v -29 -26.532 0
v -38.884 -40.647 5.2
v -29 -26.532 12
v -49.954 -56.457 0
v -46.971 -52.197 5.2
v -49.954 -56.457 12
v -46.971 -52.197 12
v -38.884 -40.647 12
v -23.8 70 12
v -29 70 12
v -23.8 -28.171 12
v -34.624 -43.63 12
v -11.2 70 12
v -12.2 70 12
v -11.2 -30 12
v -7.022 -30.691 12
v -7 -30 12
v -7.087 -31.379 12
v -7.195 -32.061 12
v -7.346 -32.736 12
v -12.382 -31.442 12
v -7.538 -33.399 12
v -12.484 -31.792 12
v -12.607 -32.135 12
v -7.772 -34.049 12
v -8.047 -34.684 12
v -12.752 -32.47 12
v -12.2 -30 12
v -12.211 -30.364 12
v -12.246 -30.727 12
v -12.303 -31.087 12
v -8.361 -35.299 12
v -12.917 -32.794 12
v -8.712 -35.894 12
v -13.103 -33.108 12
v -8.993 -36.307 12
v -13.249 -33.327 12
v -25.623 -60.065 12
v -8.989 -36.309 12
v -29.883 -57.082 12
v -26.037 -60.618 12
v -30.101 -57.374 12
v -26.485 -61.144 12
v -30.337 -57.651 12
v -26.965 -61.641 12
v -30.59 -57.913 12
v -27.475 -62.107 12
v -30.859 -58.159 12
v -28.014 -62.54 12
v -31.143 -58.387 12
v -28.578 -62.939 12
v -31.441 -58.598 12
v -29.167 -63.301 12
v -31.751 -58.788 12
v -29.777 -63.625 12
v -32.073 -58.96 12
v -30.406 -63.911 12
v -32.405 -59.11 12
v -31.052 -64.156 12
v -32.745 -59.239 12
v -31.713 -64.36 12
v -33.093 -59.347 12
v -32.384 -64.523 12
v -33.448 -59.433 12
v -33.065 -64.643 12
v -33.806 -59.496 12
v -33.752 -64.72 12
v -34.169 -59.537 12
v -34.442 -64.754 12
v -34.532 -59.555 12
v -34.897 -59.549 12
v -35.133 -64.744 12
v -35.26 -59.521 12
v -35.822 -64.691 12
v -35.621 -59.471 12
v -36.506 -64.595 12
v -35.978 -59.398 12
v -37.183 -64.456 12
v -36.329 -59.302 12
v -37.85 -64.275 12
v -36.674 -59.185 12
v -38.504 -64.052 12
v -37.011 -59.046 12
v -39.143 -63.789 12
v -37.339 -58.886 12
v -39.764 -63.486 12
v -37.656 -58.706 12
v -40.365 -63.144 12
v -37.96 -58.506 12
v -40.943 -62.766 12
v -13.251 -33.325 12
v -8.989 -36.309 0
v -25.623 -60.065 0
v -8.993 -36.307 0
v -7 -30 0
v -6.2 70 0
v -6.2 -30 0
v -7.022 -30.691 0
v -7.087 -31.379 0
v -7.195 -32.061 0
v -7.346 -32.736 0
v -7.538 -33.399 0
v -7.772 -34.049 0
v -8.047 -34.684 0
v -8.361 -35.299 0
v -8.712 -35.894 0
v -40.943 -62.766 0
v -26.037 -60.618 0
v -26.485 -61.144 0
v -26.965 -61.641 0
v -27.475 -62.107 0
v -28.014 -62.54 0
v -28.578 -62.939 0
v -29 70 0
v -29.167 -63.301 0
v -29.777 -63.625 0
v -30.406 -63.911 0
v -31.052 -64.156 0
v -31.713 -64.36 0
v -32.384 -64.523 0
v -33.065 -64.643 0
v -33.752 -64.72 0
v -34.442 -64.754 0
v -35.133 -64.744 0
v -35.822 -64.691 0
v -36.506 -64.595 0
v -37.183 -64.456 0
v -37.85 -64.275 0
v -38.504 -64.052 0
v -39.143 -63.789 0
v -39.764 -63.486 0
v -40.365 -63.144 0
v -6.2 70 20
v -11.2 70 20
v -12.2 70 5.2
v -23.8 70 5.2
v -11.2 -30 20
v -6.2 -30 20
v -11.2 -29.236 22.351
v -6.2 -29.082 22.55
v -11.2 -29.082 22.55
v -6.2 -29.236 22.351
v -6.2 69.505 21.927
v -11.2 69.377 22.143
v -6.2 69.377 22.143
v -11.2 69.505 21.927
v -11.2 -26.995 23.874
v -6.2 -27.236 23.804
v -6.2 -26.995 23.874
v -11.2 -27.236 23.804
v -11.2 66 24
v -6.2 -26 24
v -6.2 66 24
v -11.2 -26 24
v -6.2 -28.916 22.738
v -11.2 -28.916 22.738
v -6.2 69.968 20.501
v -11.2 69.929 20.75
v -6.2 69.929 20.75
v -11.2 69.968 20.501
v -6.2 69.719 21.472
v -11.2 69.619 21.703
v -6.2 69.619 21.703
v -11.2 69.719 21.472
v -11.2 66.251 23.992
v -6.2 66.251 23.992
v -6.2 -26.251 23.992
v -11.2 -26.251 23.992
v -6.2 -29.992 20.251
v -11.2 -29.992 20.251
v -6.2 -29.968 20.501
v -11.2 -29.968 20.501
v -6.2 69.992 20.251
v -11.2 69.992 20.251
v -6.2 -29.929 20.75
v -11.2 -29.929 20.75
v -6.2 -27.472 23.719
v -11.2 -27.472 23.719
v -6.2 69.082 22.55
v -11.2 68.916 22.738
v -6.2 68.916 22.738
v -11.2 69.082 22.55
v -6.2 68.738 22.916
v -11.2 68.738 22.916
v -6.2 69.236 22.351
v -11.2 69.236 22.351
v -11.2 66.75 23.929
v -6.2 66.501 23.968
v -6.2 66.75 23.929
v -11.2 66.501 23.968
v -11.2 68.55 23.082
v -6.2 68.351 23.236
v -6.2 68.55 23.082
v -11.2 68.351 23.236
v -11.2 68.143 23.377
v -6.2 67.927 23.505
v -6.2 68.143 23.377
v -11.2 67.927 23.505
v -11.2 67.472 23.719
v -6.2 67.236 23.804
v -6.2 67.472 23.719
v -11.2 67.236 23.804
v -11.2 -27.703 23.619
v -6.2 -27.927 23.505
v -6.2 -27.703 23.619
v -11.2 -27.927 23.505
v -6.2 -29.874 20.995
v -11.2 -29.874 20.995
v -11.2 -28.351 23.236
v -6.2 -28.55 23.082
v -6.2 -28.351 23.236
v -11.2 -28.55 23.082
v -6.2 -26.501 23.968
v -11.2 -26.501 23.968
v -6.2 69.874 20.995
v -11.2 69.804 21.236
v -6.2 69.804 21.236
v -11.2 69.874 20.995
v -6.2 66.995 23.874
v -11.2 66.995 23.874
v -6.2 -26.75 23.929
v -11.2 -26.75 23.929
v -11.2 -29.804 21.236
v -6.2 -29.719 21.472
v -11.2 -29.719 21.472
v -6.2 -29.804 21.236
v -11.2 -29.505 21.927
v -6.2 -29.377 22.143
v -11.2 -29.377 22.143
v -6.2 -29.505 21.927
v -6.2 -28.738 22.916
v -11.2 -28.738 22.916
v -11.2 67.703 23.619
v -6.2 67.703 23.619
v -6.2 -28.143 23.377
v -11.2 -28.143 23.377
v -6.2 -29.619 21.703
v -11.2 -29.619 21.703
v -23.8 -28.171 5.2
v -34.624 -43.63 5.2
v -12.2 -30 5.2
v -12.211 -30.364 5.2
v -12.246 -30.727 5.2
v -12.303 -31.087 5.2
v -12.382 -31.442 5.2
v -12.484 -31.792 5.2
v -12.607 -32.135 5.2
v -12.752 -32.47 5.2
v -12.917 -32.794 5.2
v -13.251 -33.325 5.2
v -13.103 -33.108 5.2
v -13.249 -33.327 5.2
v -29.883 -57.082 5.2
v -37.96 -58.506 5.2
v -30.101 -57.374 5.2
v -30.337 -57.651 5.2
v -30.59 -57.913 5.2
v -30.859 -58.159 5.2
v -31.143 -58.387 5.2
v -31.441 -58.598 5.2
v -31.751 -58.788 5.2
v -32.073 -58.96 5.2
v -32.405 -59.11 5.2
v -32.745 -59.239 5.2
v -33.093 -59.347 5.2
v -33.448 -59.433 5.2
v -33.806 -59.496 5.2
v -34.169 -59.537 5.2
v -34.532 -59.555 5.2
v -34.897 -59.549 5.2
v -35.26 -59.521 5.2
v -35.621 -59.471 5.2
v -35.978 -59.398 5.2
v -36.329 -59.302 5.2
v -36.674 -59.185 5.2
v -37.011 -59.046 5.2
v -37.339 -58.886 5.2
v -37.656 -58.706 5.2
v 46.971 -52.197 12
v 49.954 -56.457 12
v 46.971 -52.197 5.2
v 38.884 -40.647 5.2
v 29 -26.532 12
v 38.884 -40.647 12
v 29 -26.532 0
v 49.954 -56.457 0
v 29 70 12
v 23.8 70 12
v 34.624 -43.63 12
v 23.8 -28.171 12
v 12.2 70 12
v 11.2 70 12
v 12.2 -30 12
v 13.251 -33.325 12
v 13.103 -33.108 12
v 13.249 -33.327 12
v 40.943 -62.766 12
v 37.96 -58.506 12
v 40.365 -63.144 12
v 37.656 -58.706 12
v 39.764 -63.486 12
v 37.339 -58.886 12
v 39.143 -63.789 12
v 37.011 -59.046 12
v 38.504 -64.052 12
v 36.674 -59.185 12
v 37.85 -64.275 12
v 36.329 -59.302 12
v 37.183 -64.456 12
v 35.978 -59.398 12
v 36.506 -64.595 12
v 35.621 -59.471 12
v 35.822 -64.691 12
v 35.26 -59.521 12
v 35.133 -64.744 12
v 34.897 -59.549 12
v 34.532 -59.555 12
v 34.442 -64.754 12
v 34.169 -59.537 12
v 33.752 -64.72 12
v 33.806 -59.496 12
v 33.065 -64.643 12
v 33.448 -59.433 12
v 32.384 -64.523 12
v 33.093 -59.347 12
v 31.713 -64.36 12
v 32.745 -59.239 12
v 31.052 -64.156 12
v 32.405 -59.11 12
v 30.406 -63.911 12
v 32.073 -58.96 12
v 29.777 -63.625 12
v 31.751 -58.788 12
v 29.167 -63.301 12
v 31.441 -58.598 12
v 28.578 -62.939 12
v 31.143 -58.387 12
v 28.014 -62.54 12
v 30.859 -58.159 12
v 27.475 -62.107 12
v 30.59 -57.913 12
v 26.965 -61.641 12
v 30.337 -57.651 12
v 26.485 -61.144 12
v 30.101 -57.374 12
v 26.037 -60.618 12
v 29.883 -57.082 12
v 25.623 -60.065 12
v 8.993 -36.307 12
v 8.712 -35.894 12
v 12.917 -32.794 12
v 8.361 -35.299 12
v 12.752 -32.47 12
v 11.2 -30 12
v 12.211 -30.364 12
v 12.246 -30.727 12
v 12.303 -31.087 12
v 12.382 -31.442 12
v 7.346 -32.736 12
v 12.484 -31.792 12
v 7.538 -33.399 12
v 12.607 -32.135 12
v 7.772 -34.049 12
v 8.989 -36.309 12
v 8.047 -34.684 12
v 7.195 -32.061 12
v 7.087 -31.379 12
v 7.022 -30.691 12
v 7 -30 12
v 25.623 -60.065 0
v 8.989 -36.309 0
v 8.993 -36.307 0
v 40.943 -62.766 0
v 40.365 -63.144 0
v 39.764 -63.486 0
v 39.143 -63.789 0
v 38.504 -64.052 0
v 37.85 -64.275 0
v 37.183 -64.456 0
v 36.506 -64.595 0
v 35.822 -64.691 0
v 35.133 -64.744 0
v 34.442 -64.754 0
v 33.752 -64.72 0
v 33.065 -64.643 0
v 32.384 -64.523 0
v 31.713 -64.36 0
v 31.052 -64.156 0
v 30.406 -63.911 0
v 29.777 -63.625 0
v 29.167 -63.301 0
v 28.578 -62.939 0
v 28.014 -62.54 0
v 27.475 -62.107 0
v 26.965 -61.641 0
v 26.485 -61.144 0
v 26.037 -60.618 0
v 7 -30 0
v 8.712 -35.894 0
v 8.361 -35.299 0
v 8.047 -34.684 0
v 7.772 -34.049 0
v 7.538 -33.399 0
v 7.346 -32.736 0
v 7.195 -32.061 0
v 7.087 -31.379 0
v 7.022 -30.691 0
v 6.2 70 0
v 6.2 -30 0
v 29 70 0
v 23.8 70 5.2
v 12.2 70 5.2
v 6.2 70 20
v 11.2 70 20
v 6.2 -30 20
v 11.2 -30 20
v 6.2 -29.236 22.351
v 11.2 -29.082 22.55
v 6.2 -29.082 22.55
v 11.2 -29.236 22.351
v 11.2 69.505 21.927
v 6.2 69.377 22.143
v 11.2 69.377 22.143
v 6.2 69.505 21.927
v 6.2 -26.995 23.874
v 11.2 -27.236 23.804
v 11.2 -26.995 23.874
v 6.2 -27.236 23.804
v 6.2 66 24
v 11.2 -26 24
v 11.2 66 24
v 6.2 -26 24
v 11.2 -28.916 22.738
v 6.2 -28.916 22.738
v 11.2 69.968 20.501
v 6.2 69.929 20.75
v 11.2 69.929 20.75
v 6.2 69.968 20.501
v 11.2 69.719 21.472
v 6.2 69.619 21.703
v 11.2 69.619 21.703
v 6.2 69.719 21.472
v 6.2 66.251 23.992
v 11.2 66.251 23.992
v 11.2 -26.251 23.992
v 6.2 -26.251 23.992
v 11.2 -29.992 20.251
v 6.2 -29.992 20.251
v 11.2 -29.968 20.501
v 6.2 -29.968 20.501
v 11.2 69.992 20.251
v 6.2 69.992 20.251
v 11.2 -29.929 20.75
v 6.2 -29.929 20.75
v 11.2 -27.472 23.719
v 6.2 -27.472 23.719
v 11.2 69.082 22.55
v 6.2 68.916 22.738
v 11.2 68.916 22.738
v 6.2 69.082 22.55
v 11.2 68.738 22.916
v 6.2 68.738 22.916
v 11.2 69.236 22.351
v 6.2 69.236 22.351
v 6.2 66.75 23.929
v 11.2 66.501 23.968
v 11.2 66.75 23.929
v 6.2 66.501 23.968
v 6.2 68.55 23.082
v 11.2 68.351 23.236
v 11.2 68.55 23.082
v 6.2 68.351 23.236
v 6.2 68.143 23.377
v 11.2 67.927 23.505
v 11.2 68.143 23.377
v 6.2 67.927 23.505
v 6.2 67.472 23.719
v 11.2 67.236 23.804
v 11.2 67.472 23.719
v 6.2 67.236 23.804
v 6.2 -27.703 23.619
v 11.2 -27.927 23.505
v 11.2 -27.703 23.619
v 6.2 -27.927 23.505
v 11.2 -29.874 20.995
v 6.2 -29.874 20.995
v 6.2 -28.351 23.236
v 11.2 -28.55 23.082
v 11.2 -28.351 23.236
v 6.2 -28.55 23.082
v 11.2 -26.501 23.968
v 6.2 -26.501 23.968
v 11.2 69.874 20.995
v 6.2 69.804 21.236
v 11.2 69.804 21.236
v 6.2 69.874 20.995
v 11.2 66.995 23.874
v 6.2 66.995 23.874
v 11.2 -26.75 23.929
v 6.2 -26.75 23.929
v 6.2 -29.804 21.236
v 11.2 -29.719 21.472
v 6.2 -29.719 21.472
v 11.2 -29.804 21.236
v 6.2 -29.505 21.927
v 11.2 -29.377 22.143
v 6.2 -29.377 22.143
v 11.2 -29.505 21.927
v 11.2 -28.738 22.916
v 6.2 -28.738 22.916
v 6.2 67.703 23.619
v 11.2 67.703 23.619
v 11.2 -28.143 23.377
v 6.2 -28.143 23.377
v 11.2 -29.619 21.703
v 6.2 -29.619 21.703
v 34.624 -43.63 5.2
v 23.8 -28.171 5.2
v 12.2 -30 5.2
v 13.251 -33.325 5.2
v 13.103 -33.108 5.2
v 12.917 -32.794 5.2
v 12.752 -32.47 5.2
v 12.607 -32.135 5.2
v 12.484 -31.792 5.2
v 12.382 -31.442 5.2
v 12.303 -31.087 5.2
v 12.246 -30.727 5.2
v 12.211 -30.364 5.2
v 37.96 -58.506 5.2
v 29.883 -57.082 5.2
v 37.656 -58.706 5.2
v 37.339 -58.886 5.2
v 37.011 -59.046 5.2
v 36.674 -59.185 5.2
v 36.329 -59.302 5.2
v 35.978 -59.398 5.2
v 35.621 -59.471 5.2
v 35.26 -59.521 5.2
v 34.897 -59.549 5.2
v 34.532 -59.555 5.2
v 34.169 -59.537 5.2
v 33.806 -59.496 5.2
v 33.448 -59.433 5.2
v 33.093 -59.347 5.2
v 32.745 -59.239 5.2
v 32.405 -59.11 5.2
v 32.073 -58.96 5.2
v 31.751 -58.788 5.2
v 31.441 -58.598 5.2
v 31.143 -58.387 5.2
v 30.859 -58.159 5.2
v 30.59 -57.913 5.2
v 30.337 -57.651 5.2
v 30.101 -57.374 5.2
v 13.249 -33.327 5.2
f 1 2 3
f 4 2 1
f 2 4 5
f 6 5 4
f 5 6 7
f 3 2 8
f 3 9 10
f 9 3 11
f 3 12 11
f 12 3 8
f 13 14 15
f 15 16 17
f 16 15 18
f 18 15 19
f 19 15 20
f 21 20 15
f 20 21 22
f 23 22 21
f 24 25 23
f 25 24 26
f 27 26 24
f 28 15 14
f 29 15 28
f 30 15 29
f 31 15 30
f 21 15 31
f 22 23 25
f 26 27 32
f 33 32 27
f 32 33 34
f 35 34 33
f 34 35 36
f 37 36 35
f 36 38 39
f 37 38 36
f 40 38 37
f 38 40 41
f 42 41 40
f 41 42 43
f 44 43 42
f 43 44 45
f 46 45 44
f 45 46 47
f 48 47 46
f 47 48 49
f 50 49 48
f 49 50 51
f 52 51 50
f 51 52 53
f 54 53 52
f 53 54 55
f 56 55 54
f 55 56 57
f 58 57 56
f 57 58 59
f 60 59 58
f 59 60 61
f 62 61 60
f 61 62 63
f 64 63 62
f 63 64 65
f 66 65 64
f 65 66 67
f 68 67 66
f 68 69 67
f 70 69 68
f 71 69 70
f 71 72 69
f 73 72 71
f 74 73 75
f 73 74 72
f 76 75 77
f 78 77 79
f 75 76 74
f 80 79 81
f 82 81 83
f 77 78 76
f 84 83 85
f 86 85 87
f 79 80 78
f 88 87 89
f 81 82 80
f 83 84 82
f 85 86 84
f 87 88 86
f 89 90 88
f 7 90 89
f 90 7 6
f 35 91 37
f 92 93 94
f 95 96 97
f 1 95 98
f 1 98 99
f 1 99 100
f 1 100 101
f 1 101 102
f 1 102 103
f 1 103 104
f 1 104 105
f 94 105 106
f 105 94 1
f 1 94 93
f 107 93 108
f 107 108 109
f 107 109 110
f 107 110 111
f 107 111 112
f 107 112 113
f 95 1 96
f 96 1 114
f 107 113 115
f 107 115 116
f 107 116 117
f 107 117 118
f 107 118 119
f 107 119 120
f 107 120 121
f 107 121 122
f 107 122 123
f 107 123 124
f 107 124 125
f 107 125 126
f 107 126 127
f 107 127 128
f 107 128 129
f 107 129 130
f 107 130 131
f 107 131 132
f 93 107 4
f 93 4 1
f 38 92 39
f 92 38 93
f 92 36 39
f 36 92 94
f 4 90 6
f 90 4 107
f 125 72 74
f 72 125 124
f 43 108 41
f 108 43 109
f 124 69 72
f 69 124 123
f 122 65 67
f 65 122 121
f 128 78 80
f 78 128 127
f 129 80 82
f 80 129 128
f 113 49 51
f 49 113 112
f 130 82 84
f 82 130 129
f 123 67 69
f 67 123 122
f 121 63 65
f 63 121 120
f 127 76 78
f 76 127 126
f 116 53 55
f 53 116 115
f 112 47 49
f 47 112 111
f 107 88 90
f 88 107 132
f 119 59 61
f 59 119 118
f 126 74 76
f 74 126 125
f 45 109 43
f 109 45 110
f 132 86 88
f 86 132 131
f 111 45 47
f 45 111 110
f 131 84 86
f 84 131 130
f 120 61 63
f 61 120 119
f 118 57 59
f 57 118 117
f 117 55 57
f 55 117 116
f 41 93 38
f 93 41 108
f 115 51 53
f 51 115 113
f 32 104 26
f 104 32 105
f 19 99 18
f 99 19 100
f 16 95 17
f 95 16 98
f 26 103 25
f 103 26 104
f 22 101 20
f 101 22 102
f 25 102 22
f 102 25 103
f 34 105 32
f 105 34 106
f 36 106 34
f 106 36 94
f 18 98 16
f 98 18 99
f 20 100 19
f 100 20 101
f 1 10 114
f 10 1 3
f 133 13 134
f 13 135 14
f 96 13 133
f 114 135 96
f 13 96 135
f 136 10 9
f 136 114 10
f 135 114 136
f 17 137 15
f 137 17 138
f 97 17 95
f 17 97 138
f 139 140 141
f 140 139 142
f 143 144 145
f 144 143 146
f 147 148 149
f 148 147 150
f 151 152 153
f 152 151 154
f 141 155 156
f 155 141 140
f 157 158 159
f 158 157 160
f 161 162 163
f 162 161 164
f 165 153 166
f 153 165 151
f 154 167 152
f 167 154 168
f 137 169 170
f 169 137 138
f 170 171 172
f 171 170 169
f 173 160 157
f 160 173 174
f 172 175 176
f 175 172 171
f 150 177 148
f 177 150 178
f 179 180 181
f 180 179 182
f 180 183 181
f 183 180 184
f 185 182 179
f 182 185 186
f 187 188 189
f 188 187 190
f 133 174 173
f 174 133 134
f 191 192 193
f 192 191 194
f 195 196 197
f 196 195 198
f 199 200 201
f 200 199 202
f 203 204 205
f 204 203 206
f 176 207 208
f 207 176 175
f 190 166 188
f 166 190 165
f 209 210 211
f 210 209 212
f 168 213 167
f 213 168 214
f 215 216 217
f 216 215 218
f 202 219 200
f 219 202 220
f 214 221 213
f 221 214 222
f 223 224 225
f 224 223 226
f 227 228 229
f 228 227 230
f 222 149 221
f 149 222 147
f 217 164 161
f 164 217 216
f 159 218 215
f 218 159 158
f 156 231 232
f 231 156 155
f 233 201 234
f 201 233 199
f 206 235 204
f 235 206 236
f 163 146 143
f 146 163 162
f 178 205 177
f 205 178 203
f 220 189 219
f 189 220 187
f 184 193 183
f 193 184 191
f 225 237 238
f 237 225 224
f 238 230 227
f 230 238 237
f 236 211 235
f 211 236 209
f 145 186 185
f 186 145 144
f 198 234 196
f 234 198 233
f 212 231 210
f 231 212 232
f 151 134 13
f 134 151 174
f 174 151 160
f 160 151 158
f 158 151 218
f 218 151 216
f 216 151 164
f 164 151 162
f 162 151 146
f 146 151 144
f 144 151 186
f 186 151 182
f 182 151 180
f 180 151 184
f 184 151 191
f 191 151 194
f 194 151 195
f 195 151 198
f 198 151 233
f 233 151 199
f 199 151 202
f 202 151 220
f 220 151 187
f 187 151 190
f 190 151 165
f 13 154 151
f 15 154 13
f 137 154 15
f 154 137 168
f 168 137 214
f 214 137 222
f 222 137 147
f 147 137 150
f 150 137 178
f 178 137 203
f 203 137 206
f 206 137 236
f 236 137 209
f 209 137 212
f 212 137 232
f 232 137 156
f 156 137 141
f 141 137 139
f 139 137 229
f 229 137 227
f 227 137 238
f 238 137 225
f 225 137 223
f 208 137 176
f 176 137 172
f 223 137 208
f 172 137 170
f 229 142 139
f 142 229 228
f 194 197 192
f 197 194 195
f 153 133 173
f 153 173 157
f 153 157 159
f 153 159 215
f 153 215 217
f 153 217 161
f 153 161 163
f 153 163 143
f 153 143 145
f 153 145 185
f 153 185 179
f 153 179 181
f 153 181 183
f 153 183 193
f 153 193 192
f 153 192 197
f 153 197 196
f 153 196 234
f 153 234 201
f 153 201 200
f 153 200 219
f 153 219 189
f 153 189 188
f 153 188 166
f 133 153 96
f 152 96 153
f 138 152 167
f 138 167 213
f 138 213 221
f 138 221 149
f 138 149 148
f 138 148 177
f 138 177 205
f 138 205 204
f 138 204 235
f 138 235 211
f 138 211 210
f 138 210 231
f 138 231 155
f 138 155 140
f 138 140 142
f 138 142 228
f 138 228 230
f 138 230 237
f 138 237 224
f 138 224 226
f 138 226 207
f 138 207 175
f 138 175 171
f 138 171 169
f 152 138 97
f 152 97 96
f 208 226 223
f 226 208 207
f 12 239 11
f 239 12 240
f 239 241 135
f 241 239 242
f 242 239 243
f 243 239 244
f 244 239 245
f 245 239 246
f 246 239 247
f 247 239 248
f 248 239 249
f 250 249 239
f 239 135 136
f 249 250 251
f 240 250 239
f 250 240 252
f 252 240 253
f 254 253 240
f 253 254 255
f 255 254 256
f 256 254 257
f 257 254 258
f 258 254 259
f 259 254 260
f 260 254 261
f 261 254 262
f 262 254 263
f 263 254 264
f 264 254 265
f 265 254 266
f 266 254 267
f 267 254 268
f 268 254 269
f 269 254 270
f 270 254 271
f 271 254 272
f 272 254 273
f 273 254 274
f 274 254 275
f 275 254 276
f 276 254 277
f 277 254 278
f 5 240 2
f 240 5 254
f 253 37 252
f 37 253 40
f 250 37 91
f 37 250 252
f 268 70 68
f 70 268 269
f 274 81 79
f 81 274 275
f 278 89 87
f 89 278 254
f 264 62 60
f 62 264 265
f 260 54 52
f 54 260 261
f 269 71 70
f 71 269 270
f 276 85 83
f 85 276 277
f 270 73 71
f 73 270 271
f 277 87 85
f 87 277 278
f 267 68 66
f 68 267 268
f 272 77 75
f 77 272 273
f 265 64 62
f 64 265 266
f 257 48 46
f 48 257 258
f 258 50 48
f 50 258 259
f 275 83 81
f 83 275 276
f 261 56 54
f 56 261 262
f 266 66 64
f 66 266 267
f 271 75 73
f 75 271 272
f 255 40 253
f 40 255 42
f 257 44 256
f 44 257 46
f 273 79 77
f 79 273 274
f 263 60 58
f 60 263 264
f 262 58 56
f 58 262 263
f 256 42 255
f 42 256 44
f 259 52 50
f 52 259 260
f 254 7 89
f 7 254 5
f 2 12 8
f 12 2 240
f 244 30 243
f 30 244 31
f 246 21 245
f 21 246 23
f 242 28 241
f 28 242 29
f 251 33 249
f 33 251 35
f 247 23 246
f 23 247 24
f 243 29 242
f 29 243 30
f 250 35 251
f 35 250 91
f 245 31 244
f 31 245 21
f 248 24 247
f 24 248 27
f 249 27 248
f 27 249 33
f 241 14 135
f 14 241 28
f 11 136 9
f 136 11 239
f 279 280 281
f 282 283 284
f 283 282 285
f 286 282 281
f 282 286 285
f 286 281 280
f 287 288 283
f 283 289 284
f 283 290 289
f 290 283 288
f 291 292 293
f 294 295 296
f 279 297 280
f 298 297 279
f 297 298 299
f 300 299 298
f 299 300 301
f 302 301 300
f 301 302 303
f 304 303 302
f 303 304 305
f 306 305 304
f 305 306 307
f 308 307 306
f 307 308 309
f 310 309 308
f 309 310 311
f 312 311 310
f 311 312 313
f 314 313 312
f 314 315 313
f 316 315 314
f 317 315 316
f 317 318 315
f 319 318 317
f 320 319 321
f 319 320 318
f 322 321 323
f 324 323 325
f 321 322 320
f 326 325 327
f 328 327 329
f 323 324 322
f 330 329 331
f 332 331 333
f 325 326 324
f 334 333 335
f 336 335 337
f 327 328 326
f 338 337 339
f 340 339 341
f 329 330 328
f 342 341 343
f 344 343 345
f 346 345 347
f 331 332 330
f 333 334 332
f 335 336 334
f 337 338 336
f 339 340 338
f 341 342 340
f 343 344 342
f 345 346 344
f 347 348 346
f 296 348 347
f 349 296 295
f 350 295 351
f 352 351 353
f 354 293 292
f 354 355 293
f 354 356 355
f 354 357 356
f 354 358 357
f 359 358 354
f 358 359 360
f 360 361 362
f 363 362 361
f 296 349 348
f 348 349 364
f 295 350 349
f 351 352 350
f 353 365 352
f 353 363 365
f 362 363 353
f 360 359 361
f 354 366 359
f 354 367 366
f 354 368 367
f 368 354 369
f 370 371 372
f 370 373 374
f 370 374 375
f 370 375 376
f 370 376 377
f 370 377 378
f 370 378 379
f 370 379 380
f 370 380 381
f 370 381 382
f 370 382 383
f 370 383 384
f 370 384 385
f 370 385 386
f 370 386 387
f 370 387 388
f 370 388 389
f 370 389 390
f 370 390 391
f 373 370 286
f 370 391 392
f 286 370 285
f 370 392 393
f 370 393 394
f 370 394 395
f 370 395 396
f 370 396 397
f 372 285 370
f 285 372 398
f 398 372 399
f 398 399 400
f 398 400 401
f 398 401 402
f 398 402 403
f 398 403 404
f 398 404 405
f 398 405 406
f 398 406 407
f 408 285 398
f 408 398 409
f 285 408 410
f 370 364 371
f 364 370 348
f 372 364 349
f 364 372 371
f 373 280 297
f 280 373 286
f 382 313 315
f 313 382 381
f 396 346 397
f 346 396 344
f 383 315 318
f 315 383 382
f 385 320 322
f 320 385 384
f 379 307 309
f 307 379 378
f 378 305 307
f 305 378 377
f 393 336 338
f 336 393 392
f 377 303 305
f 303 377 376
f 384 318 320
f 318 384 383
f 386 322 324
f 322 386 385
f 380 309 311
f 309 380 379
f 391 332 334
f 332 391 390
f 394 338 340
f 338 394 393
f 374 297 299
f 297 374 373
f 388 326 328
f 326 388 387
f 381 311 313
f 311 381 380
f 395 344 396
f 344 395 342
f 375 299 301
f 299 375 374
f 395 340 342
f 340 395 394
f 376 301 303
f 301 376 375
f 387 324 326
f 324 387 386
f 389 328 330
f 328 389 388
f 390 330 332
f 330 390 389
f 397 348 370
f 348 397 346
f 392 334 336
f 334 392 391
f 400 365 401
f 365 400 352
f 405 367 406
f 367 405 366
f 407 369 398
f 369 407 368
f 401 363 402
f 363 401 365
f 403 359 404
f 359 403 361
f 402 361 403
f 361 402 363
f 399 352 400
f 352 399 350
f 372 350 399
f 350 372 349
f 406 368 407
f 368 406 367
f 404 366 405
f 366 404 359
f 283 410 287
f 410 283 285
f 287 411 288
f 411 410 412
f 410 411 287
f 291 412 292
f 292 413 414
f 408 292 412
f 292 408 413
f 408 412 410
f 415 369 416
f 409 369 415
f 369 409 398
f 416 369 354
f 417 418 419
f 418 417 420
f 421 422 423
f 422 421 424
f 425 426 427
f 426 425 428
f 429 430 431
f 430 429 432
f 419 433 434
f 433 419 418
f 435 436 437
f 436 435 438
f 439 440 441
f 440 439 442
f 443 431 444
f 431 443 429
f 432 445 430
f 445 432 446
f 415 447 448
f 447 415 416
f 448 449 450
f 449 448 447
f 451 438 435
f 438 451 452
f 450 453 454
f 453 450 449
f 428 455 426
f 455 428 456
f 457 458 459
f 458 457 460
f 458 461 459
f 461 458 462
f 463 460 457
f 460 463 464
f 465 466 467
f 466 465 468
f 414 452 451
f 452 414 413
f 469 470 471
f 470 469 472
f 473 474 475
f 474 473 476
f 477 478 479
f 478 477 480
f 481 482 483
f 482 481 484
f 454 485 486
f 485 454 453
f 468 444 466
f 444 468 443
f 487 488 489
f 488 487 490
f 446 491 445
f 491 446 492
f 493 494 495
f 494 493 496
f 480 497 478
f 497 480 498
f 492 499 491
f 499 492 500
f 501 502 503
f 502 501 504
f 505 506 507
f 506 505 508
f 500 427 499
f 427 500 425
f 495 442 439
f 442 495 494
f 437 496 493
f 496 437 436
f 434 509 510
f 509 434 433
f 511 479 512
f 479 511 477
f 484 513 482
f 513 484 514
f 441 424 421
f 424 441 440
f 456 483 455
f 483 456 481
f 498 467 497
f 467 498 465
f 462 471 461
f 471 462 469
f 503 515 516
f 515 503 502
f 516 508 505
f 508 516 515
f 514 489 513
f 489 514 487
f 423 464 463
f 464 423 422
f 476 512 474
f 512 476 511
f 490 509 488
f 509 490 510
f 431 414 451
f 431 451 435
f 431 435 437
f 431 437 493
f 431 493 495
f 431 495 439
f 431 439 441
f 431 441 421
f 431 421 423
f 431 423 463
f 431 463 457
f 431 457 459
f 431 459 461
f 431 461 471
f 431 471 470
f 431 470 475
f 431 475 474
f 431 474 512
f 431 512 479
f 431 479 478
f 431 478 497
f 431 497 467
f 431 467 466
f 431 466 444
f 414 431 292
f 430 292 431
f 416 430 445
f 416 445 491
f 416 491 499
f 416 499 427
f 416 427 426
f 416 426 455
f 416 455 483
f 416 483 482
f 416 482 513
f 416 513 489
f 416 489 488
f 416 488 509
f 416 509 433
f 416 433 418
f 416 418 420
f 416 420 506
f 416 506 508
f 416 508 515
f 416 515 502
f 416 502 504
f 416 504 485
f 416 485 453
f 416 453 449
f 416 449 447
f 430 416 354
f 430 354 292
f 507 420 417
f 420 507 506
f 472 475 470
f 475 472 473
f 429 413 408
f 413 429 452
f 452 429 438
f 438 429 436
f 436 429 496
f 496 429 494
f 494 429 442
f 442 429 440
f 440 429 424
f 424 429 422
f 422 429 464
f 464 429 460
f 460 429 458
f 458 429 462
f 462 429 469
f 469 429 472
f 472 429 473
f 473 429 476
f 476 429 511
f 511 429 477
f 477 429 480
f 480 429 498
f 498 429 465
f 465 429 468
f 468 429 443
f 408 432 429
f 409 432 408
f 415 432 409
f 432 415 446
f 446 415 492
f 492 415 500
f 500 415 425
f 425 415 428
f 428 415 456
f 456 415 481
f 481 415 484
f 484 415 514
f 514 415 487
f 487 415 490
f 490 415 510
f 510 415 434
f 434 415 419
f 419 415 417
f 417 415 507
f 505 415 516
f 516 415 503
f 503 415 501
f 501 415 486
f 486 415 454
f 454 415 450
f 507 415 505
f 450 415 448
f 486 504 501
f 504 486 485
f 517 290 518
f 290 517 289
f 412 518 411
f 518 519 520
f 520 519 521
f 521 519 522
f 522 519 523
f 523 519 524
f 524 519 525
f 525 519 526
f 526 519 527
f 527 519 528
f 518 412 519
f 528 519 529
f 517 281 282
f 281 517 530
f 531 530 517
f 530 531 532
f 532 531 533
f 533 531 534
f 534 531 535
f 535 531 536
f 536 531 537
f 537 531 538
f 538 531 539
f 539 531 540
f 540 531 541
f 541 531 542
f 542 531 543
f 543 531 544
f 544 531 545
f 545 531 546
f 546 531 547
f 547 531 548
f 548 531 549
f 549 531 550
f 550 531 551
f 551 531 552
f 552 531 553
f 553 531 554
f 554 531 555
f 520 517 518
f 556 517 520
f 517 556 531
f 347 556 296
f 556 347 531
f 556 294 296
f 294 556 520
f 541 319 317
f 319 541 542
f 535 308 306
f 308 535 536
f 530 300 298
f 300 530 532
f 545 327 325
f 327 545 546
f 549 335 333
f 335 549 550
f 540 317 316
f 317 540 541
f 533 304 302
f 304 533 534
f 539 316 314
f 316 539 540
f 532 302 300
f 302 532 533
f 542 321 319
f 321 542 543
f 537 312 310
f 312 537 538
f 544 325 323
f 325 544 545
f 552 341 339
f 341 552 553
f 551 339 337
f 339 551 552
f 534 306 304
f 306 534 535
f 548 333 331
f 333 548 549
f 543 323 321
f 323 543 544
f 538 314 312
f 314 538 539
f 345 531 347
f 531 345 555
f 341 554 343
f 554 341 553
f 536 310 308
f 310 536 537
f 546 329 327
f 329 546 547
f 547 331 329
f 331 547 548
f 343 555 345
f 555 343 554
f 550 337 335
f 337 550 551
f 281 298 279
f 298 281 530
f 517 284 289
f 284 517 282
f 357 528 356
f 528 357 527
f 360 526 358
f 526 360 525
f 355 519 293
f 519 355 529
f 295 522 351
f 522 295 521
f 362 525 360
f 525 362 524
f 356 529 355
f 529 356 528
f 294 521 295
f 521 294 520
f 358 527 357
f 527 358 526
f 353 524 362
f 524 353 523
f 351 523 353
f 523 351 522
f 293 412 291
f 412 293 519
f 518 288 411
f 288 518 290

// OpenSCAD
/*************************************************************
 *                        Battery Dispenser for Cylindrical Batteries                           *
 *                              By Blair Thompson    (AKA Justblair)                               *
 *                                                29/12/11                                                       *
 *                                        www.justblair.co.uk                                              *
 *                                              Version 1.0                                                      *
 *************************************************************/

// ***********************  Calibration ** ************************
// Calibrate Option.  If you wish to calibrate set this to true.  If you intend using screws to mount your battery holder
// Set the mount_tab and mount_holes variables to true to allow calibration of the mount holes as well
calibrate = false;		// If true, a calibration piece will be generated.

// *********************  Mount Tab Variables  *********************
mount_tab_opt = true;			// If true tabs will be produced
mount_tab_height = 8	;		// How high above the Channels to do you want the tab to extend
mount_tab_thickness = 5; 		// Set thicknes for the mount tab.  Beware, if you are printing models
						// for two different batt sizes, this will need to be adjusted if you want
						// the tabs to protrude the same distance from the channels.


// *********************  Back Plate Variables  *********************
back_plate= false;			// If true a backplate wil be created.
back_plate_holes_pan = true;		// If true Pan head recessess will be added 
back_plate_thickness = 6;		// Set thickness for back plate (if generated)


// *********** Mounting Holes Dimensions and Shape *******************
mount_holes = false;			// if true tabs will inculde mounting holes
mount_hole_diameter = 3;		// Hole diameters (if holes are generated)
holes_pan_diameter = 5.6; 		// Recess diameter(if generated), this is a sample value is not correct or tested
holes_pan_depth = 3;	 		// Recess depth, (if generated) this is a sample value is not correct or tested

// ***************  Channel Dimensions and Shape *******************
channel_extender_opt = false;	// Set to true if you wish to print an extension channel
$fn=100;					// Set the resolution of the curves
angle = 145;				// Sets the angle the lower section sits at
channel_depth = 12;			// How deep are the channels?  ie.  how tall the print?
channel_width = 22; 			// How wide are the channels?
lower_channel_length = 40;  		// Set lower section size
upper_channel_length= 100;		// Set upper section size

// ******************  Battery Dimensions  *************************
// Un-Comment the size that you need.  Commented lines begin //

// AAA Standard size of battery is 10.5mm x 44.5mm
battery_diameter = 11.6;  		// Needs to be set wider than your intended battery, narrower than the channel width.
battery_length = 46;			// Set slightly longer than your actual battery size

// AA  Standard size of battery is 14.5 x 50.5
// battery_diameter = 15.6;  		// Needs to be set wider than your intended battery, narrower than the channel width.
// battery_length = 52;			// Set slightly longer than your actual battery size

// ****************** Here Comes the Code! ************************

if (calibrate==true)
{
	translate ([channel_width/2,-10+lower_channel_length/2,0])  battery_holder_left(20);
} else if (channel_extender_opt != true){
	translate ([-channel_width/2-1-back_plate_thickness,-upper_channel_length/2+lower_channel_length/2,0]) 
		battery_holder_left(upper_channel_length);
	translate ([channel_width/2+1+back_plate_thickness,-upper_channel_length/2+lower_channel_length/2,0]) 
		mirror ([1,0,0]) battery_holder_left(upper_channel_length);
} else {
	translate ([-channel_width/2-1,0,0]) extension();
	translate ([+channel_width/2+1,0,0]) extension();
} // end if
	
// ************************ Modules ******************************

module battery_holder_left(tab){
	difference(){
		outer_shape(tab);
		inner_shape();


	} // end difference
} // end module

module outer_shape(outer_tab){
	cylinder (h=channel_depth, r=channel_width/2);

	if (calibrate != true){
		translate ([-channel_width/2,0,0]) cube ([channel_width, upper_channel_length, channel_depth]);
		if (back_plate == true){
			difference(){
			translate ([channel_width/2-(channel_width-battery_diameter)/2+1, 0,0]) 
				cube ([back_plate_thickness, upper_channel_length, (channel_width-battery_diameter)/2+battery_length/2]);
		if (mount_holes == true){
			back_plate_holes();
		} // end if
			} // end difference
		}  // end if
	} else {
		translate ([-channel_width/2,0,0]) cube ([channel_width, 20, channel_depth]);	
	} // end if
		if (mount_tab_opt == true){
			mount_tabs(outer_tab);
		} // end if


	rotate (angle,0,0) {
		translate([-channel_width/2,0,0]) cube ([channel_width,lower_channel_length-channel_width/2,channel_depth]);
		translate([0,0,0]) cube ([channel_width/2,lower_channel_length,channel_depth]);
		translate([0,lower_channel_length-channel_width/2,0]) cylinder (h=channel_depth, r=channel_width/2);	
	} // end rotate
} // end module

module inner_shape(){
	translate ([0,0,(channel_width-battery_diameter)/2]) 
		cylinder (h=channel_depth, r=battery_diameter/2);
	translate ([-battery_diameter/2, 0, (channel_width-battery_diameter)/2]) 
		cube ([battery_diameter,upper_channel_length+5,channel_depth]);
	rotate (angle,0,0) {
		translate ([-battery_diameter/2,0,(channel_width-battery_diameter)/2]) 
			cube ([battery_diameter,lower_channel_length-channel_width/2,channel_depth]);
		translate ([0,lower_channel_length-channel_width/2,(channel_width-battery_diameter)/2]) 
			cylinder (h=channel_depth, r=battery_diameter/2);
		translate ([0,lower_channel_length-channel_width/2-battery_diameter/2-2.5,(channel_width-battery_diameter)/2]) 
			cube ([50,battery_diameter+2.5,channel_depth]);
	} // end rotate
} // end 

module extension(){
	difference(){
		translate ([-channel_width/2,-upper_channel_length/2,0]) cube ([channel_width, upper_channel_length, channel_depth]);
	#translate ([-battery_diameter/2, -upper_channel_length/2-2.5, (channel_width-battery_diameter)/2]) 
		cube ([battery_diameter,upper_channel_length+5,channel_depth]);
	} // end difference
} // end module

module back_plate_holes(){	
	translate ([channel_width/2-(channel_width-battery_diameter)/2, upper_channel_length/4, (battery_length/2+(channel_width-battery_diameter)/2+channel_depth)/2]) rotate ([0,90,0]) 
		mount_hole();
	translate ([channel_width/2-(channel_width-battery_diameter)/2, 3*upper_channel_length/4, (battery_length/2+(channel_width-battery_diameter)/2+channel_depth)/2]) rotate ([0,90,0])
		mount_hole();
} //end module

module mount_hole(){
	cylinder (r=mount_hole_diameter/2, h=back_plate_thickness +2);
	if (back_plate_holes_pan == true){
		cylinder(r=holes_pan_diameter/2, h=holes_pan_depth+1);
	} // end if 
} // end module

module mount_tabs(tab_length){
	difference(){
	translate ([channel_width/2-(channel_width-battery_diameter)/2+1, 0,0])  rotate([0,90,0]) { 
		hull() {
   			translate([-mount_tab_height-channel_depth,tab_length-4,0]) cylinder(r=4, h=mount_tab_thickness);
   			translate([-mount_tab_height-channel_depth,4,0])cylinder(r=4, h=mount_tab_thickness);
   			translate([-4,tab_length-4,0])cube ([4,4,mount_tab_thickness] );
   			translate([-4,0,0])cube ([4,4,mount_tab_thickness] );

		 } // end hull
	} // end translate
		if (mount_holes == true){
			translate ([channel_width/2-(channel_width-battery_diameter)/2, upper_channel_length/8, mount_tab_height/2+channel_depth+2]) rotate ([0,90,0]) 
				mount_hole();
			translate ([channel_width/2-(channel_width-battery_diameter)/2, 7*upper_channel_length/8, mount_tab_height/2+channel_depth+2]) rotate ([0,90,0]) 
				mount_hole();
		}// end if
	} // end difference
} // end module
